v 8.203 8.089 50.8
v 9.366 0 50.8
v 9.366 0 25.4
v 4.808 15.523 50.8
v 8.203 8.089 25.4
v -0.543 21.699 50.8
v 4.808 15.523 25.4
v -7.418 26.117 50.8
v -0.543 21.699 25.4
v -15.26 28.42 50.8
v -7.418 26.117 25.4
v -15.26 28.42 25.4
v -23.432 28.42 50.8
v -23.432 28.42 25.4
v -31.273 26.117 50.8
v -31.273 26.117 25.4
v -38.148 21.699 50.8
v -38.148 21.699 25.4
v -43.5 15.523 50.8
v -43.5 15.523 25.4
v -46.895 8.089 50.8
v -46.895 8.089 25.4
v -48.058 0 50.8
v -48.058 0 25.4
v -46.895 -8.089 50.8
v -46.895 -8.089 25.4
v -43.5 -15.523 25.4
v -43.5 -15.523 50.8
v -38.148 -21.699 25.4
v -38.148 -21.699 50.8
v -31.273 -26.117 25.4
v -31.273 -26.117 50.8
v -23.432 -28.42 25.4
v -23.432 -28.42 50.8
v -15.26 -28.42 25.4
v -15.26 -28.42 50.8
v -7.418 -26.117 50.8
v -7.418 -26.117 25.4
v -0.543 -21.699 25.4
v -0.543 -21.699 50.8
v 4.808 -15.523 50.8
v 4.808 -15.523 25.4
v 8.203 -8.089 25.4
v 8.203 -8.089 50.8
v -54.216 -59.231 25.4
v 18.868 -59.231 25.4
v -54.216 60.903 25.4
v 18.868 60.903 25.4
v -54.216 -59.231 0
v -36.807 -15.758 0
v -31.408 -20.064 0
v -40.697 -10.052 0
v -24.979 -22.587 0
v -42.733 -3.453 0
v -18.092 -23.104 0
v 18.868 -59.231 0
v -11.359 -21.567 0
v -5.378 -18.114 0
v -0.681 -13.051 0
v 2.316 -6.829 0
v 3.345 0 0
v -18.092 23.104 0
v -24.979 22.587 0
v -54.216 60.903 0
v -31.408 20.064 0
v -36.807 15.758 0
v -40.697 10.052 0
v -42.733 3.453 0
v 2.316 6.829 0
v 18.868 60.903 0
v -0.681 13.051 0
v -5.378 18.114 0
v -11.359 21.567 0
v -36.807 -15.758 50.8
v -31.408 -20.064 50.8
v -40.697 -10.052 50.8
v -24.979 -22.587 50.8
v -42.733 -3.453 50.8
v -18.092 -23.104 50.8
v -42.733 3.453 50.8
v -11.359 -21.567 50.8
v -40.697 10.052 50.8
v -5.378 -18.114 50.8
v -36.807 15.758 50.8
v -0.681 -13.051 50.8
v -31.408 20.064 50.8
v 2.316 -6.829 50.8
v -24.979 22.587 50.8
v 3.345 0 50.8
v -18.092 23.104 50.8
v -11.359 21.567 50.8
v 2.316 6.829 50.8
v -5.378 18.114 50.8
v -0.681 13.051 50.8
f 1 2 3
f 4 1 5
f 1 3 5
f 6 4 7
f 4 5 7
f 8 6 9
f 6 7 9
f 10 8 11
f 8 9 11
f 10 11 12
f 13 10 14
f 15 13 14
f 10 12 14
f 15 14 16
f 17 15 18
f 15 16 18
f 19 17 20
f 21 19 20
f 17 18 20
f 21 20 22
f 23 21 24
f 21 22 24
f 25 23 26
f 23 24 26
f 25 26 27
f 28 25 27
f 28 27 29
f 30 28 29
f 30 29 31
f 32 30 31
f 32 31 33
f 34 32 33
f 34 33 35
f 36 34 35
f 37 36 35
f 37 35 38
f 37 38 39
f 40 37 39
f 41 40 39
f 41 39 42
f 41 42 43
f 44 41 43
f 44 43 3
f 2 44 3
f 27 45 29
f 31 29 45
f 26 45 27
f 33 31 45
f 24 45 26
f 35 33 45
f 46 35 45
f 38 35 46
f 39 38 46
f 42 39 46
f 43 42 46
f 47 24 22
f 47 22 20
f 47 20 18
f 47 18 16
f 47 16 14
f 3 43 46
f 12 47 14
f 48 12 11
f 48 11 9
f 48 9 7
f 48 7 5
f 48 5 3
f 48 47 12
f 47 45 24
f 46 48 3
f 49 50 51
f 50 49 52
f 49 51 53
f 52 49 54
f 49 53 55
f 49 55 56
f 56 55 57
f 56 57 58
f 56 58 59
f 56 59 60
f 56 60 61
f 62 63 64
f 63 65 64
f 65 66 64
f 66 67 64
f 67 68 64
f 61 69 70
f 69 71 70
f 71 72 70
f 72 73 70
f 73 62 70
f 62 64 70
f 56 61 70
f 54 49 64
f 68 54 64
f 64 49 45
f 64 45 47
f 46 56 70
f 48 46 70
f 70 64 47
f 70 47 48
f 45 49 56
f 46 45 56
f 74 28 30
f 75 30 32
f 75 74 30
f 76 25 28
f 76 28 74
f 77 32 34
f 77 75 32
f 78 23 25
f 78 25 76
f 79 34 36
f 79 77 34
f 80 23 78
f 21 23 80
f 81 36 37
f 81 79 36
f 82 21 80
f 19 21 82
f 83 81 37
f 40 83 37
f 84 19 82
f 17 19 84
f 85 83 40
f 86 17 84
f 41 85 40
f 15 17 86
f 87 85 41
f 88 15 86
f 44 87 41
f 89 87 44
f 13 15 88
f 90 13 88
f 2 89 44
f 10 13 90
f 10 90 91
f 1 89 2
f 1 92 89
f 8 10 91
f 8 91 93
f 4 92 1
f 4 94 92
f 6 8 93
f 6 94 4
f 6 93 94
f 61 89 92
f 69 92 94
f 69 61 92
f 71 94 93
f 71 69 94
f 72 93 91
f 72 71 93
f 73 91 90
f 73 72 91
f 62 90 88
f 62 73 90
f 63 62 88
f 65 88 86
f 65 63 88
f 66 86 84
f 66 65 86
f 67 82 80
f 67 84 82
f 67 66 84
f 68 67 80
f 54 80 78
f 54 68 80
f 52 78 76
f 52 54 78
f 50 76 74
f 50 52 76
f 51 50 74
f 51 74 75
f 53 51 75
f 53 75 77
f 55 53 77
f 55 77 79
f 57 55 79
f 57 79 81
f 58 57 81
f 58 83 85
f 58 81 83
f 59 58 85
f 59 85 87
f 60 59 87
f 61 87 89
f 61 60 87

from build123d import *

# Parameters (mm, degrees)
F1_R     = 28.7120004049
F2_DEPTH = 50.8
F0_W     = 73.0837620795
F0_H     = 120.1344206929
F3_DEPTH = 25.4
F4_R     = 23.1683066689
F5_DEPTH = 149.098
F6_DEPTH = 50.8


with BuildPart() as f2:
    # F1 (on Top) → F2 (new body)
    with BuildSketch(Plane.XY):
        with Locations((-19.3457026035, 0)):
            Circle(F1_R)
    extrude(amount=F2_DEPTH)

    # F0 (on Top) → F3 (join)
    with BuildSketch(Plane.XY):
        with Locations((-17.6738519222, 0.8359253407)):
            Rectangle(F0_W, F0_H)
    extrude(amount=F3_DEPTH)

    # F4 (on Top) → F5 (cut)
    with BuildSketch(Plane.XY):
        with Locations((-19.8233742267, 0)):
            Circle(F4_R)
    extrude(amount=F5_DEPTH, mode=Mode.SUBTRACT)

    # F4 (on Top) → F6 (cut)
    with BuildSketch(Plane.XY):
        with Locations((-19.8233742267, 0)):
            Circle(F4_R)
    extrude(amount=F6_DEPTH, mode=Mode.SUBTRACT)


solid = f2.part
